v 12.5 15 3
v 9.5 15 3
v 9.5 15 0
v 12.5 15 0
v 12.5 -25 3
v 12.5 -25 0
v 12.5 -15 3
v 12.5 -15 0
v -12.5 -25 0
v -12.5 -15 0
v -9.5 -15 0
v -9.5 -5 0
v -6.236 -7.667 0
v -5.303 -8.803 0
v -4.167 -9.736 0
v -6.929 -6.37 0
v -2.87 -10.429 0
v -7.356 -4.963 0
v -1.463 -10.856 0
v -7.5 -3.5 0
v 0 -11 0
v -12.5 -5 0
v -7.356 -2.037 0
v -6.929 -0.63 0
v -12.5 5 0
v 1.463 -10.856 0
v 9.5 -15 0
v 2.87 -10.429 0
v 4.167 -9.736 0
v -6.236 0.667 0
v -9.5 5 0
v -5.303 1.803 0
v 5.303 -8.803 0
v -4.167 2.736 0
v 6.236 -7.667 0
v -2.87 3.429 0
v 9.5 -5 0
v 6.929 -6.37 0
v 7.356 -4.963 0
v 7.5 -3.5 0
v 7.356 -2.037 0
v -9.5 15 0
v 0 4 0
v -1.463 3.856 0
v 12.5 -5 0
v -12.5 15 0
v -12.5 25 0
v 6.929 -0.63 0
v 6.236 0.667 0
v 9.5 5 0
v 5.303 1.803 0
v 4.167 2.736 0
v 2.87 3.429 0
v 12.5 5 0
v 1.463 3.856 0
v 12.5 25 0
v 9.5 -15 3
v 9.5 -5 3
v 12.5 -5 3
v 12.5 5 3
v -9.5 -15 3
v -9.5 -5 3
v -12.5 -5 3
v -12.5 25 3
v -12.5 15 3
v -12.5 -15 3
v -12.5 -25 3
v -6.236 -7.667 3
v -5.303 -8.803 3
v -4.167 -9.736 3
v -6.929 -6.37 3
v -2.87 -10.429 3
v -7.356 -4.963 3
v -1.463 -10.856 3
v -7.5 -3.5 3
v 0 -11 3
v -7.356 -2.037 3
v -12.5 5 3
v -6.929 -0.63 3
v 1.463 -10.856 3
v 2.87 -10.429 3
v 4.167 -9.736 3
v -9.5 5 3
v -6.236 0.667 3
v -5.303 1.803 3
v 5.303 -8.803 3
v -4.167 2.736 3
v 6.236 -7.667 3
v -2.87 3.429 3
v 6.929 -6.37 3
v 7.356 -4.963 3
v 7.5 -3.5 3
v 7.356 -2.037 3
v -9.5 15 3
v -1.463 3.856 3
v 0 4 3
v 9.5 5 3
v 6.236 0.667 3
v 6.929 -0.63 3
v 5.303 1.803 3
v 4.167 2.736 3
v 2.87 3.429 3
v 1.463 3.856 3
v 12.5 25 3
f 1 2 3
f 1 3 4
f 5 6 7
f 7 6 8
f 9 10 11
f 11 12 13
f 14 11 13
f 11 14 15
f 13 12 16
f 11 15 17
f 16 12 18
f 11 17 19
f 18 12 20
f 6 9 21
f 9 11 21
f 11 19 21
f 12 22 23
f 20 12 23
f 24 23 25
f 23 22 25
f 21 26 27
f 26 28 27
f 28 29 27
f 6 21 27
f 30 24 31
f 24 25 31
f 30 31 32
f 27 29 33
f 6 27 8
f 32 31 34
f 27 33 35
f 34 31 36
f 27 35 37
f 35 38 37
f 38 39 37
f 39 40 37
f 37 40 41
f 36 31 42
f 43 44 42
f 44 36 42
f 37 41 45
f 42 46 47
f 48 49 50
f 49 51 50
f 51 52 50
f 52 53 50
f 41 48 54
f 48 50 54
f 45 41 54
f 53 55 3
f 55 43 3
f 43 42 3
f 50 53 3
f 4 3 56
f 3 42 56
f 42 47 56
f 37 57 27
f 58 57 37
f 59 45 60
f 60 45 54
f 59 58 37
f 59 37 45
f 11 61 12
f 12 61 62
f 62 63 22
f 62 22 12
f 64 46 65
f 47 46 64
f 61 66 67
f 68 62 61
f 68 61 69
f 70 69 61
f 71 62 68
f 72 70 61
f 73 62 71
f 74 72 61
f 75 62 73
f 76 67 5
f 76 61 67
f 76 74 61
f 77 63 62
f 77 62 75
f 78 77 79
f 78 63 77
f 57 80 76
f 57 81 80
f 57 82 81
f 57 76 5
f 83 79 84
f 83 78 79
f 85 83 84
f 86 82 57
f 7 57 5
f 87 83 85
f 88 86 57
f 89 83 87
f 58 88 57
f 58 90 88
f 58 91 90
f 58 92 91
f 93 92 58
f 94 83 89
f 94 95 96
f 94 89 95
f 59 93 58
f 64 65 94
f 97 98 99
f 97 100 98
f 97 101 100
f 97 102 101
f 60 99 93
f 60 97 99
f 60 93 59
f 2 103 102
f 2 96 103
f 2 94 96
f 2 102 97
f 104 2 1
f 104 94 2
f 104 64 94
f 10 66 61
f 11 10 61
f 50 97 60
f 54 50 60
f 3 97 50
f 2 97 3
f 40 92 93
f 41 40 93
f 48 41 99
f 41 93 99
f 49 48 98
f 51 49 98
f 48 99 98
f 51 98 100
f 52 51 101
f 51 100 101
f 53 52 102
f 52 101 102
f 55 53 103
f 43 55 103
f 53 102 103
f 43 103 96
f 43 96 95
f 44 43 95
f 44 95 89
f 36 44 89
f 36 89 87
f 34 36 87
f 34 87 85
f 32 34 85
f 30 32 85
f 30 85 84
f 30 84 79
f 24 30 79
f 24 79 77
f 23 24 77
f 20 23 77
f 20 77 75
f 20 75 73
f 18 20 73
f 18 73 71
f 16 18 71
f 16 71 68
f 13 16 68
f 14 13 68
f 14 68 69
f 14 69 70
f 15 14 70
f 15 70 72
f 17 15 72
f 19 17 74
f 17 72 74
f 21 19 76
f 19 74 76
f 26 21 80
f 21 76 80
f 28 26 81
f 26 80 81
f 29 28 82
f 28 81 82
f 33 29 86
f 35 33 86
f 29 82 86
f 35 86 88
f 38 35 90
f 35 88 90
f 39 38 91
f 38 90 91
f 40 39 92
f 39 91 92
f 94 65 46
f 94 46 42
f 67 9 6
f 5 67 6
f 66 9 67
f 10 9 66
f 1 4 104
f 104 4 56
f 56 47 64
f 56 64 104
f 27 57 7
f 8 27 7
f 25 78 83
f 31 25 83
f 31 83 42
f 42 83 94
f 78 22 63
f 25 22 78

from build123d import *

# Parameters (mm, degrees)
SKETCH1_W           = 25
SKETCH1_H           = 50
BOSS_EXTRUDE1_DEPTH = 3
SKETCH2_R           = 7.5
SKETCH2_W           = 3
SKETCH2_H           = 10
CUT_EXTRUDE1_DEPTH  = 4


with BuildPart() as part:
    # Sketch1 → Boss-Extrude1 (new body)
    with BuildSketch(Plane.XY):
        Rectangle(SKETCH1_W, SKETCH1_H)
    extrude(amount=BOSS_EXTRUDE1_DEPTH)

    # Sketch2 → Cut-Extrude1 (cut, through all)
    with BuildSketch(Plane.XY.offset(3)):
        with Locations((0, -3.5)):
            Circle(SKETCH2_R)
        with Locations((11, 10)):
            Rectangle(SKETCH2_W, SKETCH2_H)
        with Locations((11, -10)):
            Rectangle(SKETCH2_W, SKETCH2_H)
        with Locations((-11, -10)):
            Rectangle(SKETCH2_W, SKETCH2_H)
        with Locations((-11, 10)):
            Rectangle(SKETCH2_W, SKETCH2_H)
    extrude(amount=-CUT_EXTRUDE1_DEPTH, mode=Mode.SUBTRACT)


solid = part.part
